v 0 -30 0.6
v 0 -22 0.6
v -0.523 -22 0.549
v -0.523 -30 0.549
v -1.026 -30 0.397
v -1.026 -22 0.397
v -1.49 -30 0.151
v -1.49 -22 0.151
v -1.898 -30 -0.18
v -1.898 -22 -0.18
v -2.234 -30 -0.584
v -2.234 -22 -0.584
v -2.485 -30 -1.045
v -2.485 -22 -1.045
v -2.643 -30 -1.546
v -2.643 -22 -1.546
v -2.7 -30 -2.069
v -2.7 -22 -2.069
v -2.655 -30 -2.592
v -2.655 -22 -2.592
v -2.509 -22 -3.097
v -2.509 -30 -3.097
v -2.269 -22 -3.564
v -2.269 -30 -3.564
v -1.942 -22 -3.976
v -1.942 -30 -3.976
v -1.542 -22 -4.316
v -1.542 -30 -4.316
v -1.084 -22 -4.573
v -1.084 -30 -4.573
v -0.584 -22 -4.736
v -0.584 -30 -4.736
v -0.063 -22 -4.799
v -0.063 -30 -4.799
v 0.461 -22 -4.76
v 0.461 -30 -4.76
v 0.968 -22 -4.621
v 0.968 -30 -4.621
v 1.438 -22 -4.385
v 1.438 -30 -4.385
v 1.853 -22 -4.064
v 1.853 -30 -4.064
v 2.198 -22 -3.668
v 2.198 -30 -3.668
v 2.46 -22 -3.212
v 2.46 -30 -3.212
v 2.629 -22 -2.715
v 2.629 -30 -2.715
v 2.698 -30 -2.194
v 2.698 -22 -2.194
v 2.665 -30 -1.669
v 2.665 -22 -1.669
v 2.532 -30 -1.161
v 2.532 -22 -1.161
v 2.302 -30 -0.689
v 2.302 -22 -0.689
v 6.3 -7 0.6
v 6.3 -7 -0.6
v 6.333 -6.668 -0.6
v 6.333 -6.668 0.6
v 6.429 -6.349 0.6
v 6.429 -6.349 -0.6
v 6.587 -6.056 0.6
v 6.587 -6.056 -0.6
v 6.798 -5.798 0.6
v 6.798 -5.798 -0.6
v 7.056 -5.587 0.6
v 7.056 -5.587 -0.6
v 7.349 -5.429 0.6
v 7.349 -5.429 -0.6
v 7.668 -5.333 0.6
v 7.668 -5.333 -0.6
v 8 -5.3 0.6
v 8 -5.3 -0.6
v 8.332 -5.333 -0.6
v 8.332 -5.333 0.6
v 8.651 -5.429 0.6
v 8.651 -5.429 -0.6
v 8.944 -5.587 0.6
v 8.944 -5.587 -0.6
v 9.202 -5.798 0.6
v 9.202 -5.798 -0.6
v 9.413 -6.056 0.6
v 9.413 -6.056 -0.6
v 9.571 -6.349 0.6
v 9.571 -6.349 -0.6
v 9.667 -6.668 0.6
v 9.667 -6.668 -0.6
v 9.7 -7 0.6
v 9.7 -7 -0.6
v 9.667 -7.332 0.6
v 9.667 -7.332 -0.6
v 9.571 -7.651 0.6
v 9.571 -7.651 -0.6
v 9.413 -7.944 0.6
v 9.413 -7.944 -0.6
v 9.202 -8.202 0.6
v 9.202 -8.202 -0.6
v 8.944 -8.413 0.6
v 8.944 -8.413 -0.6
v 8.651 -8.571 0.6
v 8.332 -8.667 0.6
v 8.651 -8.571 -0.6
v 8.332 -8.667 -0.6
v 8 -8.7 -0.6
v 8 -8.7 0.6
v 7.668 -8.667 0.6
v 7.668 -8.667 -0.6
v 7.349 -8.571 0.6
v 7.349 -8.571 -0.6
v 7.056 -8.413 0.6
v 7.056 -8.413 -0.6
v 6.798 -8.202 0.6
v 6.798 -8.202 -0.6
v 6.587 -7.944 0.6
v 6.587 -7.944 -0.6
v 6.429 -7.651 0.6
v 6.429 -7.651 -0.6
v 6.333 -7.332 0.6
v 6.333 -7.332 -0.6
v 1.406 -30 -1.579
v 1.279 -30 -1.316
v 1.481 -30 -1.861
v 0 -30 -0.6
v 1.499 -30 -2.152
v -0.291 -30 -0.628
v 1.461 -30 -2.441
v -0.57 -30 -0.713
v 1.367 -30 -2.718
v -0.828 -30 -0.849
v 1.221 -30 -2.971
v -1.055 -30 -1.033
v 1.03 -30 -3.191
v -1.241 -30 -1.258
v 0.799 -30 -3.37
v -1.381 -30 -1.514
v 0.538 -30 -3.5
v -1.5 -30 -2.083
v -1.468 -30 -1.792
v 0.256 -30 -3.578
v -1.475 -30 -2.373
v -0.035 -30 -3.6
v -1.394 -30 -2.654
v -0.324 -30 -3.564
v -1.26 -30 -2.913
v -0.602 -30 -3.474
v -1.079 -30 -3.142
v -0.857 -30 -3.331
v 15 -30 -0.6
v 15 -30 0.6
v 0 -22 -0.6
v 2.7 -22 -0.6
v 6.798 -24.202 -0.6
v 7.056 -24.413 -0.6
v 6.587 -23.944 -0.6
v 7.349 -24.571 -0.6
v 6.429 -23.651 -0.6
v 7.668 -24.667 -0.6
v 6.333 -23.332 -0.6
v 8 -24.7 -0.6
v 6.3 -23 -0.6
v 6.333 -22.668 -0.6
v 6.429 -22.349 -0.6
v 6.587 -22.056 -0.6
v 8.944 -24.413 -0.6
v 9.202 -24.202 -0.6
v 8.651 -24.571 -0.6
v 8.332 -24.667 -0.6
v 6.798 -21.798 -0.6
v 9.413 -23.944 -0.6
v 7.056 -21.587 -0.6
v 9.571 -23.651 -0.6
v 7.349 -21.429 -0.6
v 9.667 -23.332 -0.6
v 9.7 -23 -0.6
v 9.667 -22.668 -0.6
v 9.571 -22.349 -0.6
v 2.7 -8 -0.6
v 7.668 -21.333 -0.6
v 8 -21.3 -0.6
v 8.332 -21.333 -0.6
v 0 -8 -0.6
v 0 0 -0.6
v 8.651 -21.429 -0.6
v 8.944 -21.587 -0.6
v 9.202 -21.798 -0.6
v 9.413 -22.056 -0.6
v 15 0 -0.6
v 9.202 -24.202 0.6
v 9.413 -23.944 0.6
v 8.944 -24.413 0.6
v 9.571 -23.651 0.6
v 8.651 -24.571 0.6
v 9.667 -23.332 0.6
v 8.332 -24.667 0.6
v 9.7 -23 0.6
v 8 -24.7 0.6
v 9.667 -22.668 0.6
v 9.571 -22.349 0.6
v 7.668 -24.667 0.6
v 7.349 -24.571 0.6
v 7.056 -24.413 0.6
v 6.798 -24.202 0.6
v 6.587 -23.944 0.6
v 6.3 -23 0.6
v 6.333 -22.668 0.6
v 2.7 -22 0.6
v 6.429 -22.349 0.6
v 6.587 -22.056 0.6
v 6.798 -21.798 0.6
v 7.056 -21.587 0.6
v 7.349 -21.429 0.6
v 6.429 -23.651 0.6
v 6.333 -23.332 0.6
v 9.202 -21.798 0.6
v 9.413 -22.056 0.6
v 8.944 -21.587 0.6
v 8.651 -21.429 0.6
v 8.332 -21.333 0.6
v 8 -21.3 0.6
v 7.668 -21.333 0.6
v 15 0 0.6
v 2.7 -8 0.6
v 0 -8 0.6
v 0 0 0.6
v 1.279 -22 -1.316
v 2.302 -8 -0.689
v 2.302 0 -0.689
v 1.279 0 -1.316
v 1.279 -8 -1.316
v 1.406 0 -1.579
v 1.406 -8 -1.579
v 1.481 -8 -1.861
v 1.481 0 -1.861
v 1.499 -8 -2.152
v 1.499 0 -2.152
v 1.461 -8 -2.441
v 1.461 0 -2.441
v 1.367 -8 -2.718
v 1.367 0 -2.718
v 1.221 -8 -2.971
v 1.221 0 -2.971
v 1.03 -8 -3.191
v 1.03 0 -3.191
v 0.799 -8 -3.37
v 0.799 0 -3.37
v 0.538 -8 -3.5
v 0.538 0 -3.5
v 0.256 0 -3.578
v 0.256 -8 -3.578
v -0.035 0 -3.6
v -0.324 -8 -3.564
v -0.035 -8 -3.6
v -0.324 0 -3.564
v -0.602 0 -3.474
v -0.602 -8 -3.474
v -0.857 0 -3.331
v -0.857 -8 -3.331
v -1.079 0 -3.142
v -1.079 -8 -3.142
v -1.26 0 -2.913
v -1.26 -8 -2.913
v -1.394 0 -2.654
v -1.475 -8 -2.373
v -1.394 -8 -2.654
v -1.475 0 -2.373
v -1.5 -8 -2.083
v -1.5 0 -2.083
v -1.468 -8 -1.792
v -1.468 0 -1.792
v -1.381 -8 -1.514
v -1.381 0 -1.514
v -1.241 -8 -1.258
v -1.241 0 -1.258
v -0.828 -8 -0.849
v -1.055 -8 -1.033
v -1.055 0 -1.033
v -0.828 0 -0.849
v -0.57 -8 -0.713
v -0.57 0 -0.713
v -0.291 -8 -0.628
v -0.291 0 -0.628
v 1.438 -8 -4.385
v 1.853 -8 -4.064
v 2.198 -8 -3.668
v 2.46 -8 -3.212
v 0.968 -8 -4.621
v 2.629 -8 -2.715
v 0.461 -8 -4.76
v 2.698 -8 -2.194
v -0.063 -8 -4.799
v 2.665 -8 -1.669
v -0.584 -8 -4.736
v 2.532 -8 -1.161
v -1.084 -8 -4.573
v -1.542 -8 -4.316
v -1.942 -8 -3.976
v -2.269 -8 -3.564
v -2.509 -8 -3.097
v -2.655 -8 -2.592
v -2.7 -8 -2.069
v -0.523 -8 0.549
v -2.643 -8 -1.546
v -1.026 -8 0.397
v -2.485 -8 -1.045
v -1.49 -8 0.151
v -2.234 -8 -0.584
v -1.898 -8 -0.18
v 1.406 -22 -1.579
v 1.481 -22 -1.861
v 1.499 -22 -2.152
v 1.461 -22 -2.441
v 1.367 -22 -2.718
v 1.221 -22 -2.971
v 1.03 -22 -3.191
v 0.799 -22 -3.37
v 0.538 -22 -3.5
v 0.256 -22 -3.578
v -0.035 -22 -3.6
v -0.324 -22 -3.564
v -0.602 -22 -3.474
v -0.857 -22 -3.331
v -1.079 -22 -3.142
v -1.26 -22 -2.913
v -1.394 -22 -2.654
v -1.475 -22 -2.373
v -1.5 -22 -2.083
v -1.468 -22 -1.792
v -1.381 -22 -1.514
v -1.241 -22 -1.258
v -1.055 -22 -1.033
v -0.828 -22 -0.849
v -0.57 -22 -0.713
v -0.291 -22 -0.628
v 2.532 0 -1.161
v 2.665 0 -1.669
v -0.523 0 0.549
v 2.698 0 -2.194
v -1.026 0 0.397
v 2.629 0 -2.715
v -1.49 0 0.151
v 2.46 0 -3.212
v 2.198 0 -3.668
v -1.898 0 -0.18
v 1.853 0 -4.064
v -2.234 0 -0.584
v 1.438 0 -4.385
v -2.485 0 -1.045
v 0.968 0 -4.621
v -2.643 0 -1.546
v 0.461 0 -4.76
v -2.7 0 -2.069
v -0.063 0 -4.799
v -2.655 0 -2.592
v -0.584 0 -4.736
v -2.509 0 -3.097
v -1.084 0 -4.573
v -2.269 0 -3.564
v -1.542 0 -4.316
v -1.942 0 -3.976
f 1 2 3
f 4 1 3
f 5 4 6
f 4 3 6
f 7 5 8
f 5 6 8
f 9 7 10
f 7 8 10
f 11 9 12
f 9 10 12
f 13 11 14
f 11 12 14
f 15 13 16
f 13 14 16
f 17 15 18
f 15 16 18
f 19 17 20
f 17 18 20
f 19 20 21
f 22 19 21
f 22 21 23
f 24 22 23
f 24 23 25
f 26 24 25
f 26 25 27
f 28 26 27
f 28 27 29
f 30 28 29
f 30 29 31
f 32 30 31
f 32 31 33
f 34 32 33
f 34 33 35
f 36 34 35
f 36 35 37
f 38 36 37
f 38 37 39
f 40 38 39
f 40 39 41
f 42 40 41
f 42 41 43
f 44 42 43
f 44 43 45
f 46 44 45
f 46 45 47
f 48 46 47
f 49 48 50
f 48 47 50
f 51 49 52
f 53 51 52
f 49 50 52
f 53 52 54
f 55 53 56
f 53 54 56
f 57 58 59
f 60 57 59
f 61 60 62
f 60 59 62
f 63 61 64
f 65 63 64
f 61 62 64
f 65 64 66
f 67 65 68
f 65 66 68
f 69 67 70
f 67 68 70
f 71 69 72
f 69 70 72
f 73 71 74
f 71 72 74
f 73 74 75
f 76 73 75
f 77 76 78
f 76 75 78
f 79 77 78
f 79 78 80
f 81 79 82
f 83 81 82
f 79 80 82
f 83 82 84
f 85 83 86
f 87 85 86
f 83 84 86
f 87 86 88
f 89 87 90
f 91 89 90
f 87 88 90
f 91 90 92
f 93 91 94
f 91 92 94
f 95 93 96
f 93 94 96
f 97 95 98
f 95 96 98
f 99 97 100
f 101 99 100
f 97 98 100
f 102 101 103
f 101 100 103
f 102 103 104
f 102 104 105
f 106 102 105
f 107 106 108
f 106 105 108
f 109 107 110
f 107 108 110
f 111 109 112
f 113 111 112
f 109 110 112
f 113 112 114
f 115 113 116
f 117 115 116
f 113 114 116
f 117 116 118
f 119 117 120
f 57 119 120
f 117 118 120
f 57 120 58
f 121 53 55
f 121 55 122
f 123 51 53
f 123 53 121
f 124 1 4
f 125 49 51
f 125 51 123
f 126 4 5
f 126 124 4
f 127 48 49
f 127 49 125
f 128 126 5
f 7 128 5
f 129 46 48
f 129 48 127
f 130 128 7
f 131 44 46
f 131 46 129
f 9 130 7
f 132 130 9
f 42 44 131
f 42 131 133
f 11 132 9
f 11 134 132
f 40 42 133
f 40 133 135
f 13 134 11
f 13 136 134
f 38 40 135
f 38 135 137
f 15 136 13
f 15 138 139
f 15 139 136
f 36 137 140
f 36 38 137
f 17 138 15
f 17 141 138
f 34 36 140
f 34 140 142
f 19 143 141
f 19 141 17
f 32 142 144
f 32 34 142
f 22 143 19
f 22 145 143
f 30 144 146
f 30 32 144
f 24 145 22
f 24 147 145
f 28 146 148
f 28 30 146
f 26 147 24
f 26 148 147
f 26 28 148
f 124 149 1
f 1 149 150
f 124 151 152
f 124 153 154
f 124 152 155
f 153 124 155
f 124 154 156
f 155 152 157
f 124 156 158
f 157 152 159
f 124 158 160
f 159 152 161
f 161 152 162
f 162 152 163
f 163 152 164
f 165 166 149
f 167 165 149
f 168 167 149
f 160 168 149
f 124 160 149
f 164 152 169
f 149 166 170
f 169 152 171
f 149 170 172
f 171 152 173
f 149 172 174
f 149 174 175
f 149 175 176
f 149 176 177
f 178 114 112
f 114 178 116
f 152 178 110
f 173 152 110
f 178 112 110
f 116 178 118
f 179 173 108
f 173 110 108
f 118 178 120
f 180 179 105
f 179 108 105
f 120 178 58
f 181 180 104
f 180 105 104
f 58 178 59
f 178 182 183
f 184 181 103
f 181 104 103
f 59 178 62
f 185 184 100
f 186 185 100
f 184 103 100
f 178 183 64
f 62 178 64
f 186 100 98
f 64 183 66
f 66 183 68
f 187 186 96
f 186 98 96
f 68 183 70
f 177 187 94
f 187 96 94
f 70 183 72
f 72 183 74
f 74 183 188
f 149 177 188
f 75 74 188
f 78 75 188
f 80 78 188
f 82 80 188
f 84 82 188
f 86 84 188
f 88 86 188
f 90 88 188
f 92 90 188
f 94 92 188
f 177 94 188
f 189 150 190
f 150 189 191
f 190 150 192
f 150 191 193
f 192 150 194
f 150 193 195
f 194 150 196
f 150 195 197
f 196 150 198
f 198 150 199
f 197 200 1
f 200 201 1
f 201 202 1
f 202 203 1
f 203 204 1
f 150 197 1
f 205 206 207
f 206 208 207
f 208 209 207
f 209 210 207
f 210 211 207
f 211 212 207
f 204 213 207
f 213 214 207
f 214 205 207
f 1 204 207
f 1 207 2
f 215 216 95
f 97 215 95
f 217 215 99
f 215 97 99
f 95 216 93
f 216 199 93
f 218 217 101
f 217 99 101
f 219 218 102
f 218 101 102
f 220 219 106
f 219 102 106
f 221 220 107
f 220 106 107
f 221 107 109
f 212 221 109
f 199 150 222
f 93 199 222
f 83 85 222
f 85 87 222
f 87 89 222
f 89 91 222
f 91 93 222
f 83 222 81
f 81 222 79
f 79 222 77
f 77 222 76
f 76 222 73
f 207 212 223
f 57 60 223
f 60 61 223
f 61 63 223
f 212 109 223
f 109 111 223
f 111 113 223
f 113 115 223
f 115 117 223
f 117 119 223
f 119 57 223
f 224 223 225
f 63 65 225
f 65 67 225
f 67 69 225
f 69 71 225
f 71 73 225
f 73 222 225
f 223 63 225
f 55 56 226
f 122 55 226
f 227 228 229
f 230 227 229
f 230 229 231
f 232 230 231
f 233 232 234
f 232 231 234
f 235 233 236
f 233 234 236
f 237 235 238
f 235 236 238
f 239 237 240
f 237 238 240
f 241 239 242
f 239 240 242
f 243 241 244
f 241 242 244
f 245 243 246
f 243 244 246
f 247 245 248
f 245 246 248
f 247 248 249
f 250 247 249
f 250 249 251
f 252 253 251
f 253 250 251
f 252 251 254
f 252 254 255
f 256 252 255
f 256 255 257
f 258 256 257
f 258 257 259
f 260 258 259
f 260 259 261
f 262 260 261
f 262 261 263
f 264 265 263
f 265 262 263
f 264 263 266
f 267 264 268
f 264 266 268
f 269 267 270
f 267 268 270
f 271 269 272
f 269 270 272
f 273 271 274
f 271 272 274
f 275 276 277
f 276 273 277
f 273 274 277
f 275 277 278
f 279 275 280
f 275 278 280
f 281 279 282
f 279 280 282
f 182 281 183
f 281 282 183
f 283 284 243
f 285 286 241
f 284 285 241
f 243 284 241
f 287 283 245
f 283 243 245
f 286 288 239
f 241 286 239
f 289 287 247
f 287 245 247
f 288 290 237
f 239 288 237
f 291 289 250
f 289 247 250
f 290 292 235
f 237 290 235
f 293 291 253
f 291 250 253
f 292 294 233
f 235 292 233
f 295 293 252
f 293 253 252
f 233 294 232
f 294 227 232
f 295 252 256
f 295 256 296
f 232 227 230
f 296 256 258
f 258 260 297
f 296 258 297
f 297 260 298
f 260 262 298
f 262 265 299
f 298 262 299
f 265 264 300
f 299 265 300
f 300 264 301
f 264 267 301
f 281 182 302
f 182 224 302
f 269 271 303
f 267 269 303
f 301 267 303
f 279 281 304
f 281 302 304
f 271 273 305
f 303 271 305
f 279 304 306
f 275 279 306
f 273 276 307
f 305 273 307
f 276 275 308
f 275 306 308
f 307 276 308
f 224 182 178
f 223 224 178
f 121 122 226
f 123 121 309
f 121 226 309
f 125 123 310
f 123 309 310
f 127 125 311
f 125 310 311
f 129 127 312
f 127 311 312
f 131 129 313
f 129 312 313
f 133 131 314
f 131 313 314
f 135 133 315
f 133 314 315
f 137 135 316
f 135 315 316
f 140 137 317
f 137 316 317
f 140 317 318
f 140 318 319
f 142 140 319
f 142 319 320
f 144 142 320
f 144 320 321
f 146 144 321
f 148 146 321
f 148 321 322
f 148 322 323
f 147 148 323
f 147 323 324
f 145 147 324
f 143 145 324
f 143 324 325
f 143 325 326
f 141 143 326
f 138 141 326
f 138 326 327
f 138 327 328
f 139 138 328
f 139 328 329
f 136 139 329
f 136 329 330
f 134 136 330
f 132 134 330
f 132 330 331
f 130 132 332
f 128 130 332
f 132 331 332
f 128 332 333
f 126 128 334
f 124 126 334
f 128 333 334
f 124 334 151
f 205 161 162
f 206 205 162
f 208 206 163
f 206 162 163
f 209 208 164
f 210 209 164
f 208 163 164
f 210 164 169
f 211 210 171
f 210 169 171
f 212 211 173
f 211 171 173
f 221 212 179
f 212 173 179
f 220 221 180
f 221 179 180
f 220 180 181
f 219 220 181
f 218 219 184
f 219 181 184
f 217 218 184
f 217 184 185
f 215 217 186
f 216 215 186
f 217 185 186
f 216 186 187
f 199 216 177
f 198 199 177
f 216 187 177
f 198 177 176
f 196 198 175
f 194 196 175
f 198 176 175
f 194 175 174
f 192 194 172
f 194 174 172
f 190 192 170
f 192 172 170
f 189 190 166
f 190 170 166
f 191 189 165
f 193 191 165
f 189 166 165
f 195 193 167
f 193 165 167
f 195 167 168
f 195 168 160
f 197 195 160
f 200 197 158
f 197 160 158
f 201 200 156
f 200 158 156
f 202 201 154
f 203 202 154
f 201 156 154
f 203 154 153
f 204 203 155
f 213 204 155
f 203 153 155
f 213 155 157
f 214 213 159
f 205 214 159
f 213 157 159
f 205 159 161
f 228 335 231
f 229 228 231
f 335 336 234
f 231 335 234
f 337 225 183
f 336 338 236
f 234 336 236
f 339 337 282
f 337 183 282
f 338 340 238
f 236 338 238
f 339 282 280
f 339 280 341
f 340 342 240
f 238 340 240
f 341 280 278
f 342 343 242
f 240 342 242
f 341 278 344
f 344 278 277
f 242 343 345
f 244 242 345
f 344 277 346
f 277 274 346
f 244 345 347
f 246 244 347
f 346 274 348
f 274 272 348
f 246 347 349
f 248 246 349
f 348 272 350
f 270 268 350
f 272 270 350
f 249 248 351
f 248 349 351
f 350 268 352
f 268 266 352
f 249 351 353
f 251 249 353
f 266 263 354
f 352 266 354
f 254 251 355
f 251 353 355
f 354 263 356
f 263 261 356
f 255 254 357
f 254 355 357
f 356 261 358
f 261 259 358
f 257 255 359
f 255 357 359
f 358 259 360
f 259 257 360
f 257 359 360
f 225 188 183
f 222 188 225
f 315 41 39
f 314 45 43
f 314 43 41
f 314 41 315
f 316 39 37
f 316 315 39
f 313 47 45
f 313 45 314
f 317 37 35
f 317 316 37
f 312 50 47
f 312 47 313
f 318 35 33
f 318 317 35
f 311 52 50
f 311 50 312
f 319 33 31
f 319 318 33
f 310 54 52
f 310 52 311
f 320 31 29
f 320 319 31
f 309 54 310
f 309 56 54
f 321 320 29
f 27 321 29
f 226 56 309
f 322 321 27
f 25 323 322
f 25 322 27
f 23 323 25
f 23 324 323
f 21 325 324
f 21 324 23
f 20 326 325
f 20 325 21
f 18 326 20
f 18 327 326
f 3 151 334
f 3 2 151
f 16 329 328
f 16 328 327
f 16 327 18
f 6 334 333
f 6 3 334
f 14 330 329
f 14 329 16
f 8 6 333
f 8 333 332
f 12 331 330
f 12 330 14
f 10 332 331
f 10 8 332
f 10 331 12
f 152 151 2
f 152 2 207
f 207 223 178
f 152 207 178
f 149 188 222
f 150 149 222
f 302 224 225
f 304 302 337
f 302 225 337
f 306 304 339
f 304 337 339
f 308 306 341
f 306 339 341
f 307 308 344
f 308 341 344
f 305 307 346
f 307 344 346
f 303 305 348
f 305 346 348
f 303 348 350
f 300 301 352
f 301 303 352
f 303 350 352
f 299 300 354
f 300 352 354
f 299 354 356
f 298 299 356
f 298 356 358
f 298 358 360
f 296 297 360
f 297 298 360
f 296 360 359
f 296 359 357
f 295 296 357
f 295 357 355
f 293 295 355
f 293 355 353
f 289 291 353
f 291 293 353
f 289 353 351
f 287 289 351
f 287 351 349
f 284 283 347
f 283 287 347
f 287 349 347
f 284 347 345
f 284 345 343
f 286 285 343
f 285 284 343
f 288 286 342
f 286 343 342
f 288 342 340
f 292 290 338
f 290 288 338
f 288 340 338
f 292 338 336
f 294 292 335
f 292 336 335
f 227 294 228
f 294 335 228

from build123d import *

# Parameters (mm, degrees)
Y_KSEKLIK_EKSTR_ZYON1_DEPTH = 30
KES_EKSTR_ZYON2_START       = -22
KES_EKSTR_ZYON2_DEPTH       = 14
IZIM4_R                     = 1.7
KES_EKSTR_ZYON3_DEPTH       = 1.2


with BuildPart() as part:
    # Çizim1 → Yükseklik-Ekstrüzyon1 (new body)
    with BuildSketch(Plane(origin=(0, 0, 0), x_dir=(1, 0, 0), z_dir=(0, 1, 0))):
        with BuildLine():
            Line((0, 0.6), (15, 0.6))
            Line((15, 0.6), (15, -0.6))
            Line((15, -0.6), (0, -0.6))
            ThreePointArc((0, -0.6), (-1.319038138, 4.455873169), (2.301841896, 0.688786378))
            Line((2.301841896, 0.688786378), (1.278801053, 1.315992432))
            ThreePointArc((1.278801053, 1.315992432), (-0.732798966, 3.408818427), (0, 0.6))
        make_face()
    extrude(amount=-Y_KSEKLIK_EKSTR_ZYON1_DEPTH)

    # Çizim3 → Kes-Ekstrüzyon2 (cut)
    with BuildSketch(Plane.XZ.offset(30).offset(KES_EKSTR_ZYON2_START)):
        with BuildLine():
            Line((1.278801053, -1.315992432), (2.301841896, -0.688786378))
            ThreePointArc((2.301841896, -0.688786378), (-1.319038138, -4.455873169), (0, 0.6))
            Line((0, 0.6), (2.7, 0.6))
            Line((2.7, 0.6), (2.7, -0.6))
            Line((2.7, -0.6), (0, -0.6))
            ThreePointArc((0, -0.6), (-0.732798966, -3.408818427), (1.278801053, -1.315992432))
        make_face()
    extrude(amount=KES_EKSTR_ZYON2_DEPTH, mode=Mode.SUBTRACT)

    # Çizim4 → Kes-Ekstrüzyon3 (cut)
    with BuildSketch(Plane(origin=(0, 0, -0.6), x_dir=(-1, 0, 0), z_dir=(0, 0, -1))):
        with Locations((-8, -23)):
            Circle(IZIM4_R)
        with Locations((-8, -7)):
            Circle(IZIM4_R)
    extrude(amount=-KES_EKSTR_ZYON3_DEPTH, mode=Mode.SUBTRACT)


solid = part.part
